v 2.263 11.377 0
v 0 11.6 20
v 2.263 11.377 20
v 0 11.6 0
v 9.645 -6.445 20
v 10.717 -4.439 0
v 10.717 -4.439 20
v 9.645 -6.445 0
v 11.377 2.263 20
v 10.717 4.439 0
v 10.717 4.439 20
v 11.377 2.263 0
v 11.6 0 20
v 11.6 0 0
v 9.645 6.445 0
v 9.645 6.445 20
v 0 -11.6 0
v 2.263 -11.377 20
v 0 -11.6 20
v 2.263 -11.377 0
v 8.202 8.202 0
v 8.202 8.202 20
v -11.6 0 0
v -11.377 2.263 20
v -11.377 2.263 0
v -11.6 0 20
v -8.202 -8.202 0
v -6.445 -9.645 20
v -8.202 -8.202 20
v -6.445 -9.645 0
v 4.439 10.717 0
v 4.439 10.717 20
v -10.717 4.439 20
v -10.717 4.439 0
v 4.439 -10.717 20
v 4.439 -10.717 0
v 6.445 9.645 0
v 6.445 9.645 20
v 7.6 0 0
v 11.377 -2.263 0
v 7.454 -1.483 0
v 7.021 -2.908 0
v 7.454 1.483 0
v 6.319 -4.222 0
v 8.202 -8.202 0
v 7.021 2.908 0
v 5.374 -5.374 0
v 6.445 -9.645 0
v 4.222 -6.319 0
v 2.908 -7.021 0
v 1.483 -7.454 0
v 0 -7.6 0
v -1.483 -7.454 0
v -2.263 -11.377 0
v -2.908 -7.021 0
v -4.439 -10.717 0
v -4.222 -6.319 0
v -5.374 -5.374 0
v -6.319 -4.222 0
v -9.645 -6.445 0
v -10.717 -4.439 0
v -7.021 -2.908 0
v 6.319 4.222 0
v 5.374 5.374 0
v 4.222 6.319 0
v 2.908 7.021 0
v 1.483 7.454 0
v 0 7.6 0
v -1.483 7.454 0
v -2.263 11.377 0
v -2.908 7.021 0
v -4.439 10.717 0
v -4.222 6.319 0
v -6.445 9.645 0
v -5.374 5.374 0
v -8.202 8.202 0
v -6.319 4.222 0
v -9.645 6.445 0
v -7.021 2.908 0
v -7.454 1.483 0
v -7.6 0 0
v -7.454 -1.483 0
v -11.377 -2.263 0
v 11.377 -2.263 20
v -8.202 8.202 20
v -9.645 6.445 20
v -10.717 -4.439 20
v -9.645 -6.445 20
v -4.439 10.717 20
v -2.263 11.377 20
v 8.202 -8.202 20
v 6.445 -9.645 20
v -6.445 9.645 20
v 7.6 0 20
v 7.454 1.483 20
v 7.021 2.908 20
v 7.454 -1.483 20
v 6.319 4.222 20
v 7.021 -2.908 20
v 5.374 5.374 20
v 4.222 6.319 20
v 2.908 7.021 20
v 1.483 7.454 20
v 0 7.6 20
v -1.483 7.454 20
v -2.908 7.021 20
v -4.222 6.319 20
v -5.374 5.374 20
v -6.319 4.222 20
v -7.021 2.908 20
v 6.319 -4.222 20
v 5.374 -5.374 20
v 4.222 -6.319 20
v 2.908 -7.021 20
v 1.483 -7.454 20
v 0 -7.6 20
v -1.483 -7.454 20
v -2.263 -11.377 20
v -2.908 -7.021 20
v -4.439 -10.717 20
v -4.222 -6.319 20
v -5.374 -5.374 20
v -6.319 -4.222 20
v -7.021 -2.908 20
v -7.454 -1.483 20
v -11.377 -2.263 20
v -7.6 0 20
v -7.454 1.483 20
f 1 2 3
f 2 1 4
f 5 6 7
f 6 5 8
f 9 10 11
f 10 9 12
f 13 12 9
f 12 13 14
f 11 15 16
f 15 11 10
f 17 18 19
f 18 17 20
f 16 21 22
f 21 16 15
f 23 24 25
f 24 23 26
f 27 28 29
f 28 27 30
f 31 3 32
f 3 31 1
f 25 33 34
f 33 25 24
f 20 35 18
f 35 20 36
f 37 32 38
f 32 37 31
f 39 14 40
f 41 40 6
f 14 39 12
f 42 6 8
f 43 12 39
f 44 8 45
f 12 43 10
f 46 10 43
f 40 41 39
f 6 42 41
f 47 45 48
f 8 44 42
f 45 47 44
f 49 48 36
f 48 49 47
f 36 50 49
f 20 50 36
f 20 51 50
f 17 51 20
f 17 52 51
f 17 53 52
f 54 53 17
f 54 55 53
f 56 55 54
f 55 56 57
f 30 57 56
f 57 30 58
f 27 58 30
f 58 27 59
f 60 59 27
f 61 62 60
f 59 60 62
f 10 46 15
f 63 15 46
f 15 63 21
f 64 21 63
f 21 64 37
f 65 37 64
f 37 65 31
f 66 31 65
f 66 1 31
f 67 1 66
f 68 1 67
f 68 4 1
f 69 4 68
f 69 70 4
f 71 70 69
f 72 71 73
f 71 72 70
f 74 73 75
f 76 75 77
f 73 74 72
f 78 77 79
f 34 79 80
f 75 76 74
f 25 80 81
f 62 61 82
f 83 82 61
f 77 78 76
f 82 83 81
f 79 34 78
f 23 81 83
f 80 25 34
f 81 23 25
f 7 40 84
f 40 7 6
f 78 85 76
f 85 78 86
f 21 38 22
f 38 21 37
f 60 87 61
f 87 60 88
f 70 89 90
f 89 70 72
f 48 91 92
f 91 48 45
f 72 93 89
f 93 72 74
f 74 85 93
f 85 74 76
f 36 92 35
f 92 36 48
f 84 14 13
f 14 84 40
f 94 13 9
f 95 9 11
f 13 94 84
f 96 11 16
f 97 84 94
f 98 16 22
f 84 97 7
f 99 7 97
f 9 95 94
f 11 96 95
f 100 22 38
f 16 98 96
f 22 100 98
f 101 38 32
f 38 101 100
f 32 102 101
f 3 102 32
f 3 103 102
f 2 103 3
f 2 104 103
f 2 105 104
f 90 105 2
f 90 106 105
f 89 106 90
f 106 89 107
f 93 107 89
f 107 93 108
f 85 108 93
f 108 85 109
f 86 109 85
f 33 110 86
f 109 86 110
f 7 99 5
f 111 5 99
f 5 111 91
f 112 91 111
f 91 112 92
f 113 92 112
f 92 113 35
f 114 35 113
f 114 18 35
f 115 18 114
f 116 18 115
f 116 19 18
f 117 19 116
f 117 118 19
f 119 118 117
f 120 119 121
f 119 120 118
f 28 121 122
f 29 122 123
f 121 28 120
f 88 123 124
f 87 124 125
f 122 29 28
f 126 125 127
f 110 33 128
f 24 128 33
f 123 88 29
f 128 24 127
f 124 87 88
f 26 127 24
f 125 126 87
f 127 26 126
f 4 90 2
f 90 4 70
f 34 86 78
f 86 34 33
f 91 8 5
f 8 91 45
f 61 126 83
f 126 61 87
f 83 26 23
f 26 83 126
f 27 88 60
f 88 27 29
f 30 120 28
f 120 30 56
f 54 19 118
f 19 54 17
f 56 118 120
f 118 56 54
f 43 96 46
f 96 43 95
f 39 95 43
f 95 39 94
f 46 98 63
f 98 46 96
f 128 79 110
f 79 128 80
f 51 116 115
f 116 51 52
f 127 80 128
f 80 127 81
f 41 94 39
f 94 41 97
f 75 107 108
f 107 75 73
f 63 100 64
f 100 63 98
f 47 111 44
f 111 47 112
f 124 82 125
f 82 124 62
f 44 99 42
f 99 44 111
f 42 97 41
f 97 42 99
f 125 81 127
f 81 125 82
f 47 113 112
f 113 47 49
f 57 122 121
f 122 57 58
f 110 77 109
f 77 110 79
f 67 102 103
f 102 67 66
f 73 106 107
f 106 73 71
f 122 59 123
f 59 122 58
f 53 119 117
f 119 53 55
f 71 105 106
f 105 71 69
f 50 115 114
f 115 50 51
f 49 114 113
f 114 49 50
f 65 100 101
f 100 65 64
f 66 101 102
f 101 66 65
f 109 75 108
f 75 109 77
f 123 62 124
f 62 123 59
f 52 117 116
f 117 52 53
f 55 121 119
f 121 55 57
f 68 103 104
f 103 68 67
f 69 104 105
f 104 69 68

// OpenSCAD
$fn = 32;

// ----------------------------------------------------------------------
// Spacer sleeve: 23.2 / 15.2 x 20 mm
// ----------------------------------------------------------------------

// --- parameters (mm) ---
sleeve_od = 23.2;         // outside diameter
sleeve_id = 15.2;         // shaft bore
sleeve_l = 20;            // sleeve length

module sleeve() {
  cylinder(h = sleeve_l, d = sleeve_od);
}

difference() {
  sleeve();
  translate([0, 0, -1]) cylinder(h = sleeve_l + 2, d = sleeve_id);
}
